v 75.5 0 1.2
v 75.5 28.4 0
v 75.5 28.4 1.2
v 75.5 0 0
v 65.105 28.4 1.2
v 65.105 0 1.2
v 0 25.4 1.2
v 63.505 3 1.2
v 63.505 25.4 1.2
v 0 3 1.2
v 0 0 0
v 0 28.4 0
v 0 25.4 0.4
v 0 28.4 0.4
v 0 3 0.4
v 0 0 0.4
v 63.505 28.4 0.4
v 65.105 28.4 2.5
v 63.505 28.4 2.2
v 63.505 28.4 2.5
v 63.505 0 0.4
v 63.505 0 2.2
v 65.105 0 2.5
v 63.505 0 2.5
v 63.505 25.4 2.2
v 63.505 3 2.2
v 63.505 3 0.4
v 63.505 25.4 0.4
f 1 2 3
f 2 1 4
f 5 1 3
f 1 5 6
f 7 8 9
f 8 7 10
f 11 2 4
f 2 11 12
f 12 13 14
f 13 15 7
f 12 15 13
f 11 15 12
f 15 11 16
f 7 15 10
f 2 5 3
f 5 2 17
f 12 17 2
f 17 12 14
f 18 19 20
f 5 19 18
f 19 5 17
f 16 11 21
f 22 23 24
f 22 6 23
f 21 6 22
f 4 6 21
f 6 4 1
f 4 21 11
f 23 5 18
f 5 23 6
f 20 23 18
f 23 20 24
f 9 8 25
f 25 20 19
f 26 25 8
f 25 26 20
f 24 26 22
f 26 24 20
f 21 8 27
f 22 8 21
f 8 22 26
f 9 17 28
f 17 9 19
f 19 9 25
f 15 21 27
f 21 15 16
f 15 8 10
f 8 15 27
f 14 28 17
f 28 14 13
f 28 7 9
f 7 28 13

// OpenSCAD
// Insulating tray for the YD-ESP32-S3 (DevKitC-1 clone) in a Hammond 1590A lid.
//
// The 1590A lid is a 2 mm plate with a 2 mm lip that fits into the box; inside
// the lip is a 2 mm deep recess (~82.8 x 28.8 mm). This plate lies in that
// recess and the board lies on the plate, its edges guided by the lip. Grooves
// take the clipped pin stubs, an end stop sits at the antenna end, the USB end
// stays open (plug a cable into the board's UART port with the lid off). Tape the
// board to the plate and the plate into the lid.
// Print flat, PETG or PLA. Coordinates: z = 0 is the inner face of the lid plate.

/* [Board: YD-ESP32-S3, from the vendor drawing] */
board_l = 57.15;         // PCB length (USB end to antenna end)
board_w = 27.94;
pcb_t = 1.6;
row_spacing = 25.40;     // pin rows, centre to centre
antenna_overhang = 6.24; // module sticking out past the PCB at the antenna end

/* [Lid: Hammond 1590A] */
recess_w = 28.8;         // inside the lid lip: 31.5 - 2 x 1.35
lip_h = 2.0;             // the lip, i.e. the recess depth

screw_dx = 82.6;         // lid screw holes, centre to centre along the length
notch_r = 3.35;          // radius of the recess corner notches around the screw holes
                         // (hole 4.0 / 2 + lip wall 1.35): measure on the real lid

/* [Plate] */
fit = 0.2;               // clearance per side to the lip and notches
// Long enough that the corner notches locate the plate lengthwise
plate_l = screw_dx - 2 * notch_r - 2 * fit;
plate_t = 1.2;
groove_w = 3.0;          // grooves for the pin stubs: clip them to ~0.6 mm
groove_d = 0.8;
end_stop_w = 1.6;
end_stop_fit = 0.3;      // play between board end and end stop

$fn = 32;

// derived
plate_w = recess_w - 2 * fit;
cy = plate_w / 2;
// board + antenna centred, so the tall parts on top stay in the middle section
// of the box between its corner bosses
usb_x = (plate_l - (board_l + antenna_overhang)) / 2; // USB edge of the board
stop_x = usb_x + board_l + end_stop_fit;
stop_h = plate_t + pcb_t - 0.3; // below the PCB top: the module overhangs above it

assert(board_w <= plate_w, "board wider than the lid recess");
assert(usb_x >= 0, "plate too short for the board");
assert(groove_d < plate_t, "grooves would cut through the plate (it insulates the board from the lid)");

difference() {
  union() {
    cube([plate_l, plate_w, plate_t]);
    translate([stop_x, 0, 0]) cube([end_stop_w, plate_w, stop_h]);
  }
  // grooves under both pin rows, running out of the open USB end
  for (s = [-1, 1])
    translate([-1, cy + s * row_spacing / 2 - groove_w / 2, plate_t - groove_d])
      cube([stop_x + 1, groove_w, groove_d + 1]);
}
